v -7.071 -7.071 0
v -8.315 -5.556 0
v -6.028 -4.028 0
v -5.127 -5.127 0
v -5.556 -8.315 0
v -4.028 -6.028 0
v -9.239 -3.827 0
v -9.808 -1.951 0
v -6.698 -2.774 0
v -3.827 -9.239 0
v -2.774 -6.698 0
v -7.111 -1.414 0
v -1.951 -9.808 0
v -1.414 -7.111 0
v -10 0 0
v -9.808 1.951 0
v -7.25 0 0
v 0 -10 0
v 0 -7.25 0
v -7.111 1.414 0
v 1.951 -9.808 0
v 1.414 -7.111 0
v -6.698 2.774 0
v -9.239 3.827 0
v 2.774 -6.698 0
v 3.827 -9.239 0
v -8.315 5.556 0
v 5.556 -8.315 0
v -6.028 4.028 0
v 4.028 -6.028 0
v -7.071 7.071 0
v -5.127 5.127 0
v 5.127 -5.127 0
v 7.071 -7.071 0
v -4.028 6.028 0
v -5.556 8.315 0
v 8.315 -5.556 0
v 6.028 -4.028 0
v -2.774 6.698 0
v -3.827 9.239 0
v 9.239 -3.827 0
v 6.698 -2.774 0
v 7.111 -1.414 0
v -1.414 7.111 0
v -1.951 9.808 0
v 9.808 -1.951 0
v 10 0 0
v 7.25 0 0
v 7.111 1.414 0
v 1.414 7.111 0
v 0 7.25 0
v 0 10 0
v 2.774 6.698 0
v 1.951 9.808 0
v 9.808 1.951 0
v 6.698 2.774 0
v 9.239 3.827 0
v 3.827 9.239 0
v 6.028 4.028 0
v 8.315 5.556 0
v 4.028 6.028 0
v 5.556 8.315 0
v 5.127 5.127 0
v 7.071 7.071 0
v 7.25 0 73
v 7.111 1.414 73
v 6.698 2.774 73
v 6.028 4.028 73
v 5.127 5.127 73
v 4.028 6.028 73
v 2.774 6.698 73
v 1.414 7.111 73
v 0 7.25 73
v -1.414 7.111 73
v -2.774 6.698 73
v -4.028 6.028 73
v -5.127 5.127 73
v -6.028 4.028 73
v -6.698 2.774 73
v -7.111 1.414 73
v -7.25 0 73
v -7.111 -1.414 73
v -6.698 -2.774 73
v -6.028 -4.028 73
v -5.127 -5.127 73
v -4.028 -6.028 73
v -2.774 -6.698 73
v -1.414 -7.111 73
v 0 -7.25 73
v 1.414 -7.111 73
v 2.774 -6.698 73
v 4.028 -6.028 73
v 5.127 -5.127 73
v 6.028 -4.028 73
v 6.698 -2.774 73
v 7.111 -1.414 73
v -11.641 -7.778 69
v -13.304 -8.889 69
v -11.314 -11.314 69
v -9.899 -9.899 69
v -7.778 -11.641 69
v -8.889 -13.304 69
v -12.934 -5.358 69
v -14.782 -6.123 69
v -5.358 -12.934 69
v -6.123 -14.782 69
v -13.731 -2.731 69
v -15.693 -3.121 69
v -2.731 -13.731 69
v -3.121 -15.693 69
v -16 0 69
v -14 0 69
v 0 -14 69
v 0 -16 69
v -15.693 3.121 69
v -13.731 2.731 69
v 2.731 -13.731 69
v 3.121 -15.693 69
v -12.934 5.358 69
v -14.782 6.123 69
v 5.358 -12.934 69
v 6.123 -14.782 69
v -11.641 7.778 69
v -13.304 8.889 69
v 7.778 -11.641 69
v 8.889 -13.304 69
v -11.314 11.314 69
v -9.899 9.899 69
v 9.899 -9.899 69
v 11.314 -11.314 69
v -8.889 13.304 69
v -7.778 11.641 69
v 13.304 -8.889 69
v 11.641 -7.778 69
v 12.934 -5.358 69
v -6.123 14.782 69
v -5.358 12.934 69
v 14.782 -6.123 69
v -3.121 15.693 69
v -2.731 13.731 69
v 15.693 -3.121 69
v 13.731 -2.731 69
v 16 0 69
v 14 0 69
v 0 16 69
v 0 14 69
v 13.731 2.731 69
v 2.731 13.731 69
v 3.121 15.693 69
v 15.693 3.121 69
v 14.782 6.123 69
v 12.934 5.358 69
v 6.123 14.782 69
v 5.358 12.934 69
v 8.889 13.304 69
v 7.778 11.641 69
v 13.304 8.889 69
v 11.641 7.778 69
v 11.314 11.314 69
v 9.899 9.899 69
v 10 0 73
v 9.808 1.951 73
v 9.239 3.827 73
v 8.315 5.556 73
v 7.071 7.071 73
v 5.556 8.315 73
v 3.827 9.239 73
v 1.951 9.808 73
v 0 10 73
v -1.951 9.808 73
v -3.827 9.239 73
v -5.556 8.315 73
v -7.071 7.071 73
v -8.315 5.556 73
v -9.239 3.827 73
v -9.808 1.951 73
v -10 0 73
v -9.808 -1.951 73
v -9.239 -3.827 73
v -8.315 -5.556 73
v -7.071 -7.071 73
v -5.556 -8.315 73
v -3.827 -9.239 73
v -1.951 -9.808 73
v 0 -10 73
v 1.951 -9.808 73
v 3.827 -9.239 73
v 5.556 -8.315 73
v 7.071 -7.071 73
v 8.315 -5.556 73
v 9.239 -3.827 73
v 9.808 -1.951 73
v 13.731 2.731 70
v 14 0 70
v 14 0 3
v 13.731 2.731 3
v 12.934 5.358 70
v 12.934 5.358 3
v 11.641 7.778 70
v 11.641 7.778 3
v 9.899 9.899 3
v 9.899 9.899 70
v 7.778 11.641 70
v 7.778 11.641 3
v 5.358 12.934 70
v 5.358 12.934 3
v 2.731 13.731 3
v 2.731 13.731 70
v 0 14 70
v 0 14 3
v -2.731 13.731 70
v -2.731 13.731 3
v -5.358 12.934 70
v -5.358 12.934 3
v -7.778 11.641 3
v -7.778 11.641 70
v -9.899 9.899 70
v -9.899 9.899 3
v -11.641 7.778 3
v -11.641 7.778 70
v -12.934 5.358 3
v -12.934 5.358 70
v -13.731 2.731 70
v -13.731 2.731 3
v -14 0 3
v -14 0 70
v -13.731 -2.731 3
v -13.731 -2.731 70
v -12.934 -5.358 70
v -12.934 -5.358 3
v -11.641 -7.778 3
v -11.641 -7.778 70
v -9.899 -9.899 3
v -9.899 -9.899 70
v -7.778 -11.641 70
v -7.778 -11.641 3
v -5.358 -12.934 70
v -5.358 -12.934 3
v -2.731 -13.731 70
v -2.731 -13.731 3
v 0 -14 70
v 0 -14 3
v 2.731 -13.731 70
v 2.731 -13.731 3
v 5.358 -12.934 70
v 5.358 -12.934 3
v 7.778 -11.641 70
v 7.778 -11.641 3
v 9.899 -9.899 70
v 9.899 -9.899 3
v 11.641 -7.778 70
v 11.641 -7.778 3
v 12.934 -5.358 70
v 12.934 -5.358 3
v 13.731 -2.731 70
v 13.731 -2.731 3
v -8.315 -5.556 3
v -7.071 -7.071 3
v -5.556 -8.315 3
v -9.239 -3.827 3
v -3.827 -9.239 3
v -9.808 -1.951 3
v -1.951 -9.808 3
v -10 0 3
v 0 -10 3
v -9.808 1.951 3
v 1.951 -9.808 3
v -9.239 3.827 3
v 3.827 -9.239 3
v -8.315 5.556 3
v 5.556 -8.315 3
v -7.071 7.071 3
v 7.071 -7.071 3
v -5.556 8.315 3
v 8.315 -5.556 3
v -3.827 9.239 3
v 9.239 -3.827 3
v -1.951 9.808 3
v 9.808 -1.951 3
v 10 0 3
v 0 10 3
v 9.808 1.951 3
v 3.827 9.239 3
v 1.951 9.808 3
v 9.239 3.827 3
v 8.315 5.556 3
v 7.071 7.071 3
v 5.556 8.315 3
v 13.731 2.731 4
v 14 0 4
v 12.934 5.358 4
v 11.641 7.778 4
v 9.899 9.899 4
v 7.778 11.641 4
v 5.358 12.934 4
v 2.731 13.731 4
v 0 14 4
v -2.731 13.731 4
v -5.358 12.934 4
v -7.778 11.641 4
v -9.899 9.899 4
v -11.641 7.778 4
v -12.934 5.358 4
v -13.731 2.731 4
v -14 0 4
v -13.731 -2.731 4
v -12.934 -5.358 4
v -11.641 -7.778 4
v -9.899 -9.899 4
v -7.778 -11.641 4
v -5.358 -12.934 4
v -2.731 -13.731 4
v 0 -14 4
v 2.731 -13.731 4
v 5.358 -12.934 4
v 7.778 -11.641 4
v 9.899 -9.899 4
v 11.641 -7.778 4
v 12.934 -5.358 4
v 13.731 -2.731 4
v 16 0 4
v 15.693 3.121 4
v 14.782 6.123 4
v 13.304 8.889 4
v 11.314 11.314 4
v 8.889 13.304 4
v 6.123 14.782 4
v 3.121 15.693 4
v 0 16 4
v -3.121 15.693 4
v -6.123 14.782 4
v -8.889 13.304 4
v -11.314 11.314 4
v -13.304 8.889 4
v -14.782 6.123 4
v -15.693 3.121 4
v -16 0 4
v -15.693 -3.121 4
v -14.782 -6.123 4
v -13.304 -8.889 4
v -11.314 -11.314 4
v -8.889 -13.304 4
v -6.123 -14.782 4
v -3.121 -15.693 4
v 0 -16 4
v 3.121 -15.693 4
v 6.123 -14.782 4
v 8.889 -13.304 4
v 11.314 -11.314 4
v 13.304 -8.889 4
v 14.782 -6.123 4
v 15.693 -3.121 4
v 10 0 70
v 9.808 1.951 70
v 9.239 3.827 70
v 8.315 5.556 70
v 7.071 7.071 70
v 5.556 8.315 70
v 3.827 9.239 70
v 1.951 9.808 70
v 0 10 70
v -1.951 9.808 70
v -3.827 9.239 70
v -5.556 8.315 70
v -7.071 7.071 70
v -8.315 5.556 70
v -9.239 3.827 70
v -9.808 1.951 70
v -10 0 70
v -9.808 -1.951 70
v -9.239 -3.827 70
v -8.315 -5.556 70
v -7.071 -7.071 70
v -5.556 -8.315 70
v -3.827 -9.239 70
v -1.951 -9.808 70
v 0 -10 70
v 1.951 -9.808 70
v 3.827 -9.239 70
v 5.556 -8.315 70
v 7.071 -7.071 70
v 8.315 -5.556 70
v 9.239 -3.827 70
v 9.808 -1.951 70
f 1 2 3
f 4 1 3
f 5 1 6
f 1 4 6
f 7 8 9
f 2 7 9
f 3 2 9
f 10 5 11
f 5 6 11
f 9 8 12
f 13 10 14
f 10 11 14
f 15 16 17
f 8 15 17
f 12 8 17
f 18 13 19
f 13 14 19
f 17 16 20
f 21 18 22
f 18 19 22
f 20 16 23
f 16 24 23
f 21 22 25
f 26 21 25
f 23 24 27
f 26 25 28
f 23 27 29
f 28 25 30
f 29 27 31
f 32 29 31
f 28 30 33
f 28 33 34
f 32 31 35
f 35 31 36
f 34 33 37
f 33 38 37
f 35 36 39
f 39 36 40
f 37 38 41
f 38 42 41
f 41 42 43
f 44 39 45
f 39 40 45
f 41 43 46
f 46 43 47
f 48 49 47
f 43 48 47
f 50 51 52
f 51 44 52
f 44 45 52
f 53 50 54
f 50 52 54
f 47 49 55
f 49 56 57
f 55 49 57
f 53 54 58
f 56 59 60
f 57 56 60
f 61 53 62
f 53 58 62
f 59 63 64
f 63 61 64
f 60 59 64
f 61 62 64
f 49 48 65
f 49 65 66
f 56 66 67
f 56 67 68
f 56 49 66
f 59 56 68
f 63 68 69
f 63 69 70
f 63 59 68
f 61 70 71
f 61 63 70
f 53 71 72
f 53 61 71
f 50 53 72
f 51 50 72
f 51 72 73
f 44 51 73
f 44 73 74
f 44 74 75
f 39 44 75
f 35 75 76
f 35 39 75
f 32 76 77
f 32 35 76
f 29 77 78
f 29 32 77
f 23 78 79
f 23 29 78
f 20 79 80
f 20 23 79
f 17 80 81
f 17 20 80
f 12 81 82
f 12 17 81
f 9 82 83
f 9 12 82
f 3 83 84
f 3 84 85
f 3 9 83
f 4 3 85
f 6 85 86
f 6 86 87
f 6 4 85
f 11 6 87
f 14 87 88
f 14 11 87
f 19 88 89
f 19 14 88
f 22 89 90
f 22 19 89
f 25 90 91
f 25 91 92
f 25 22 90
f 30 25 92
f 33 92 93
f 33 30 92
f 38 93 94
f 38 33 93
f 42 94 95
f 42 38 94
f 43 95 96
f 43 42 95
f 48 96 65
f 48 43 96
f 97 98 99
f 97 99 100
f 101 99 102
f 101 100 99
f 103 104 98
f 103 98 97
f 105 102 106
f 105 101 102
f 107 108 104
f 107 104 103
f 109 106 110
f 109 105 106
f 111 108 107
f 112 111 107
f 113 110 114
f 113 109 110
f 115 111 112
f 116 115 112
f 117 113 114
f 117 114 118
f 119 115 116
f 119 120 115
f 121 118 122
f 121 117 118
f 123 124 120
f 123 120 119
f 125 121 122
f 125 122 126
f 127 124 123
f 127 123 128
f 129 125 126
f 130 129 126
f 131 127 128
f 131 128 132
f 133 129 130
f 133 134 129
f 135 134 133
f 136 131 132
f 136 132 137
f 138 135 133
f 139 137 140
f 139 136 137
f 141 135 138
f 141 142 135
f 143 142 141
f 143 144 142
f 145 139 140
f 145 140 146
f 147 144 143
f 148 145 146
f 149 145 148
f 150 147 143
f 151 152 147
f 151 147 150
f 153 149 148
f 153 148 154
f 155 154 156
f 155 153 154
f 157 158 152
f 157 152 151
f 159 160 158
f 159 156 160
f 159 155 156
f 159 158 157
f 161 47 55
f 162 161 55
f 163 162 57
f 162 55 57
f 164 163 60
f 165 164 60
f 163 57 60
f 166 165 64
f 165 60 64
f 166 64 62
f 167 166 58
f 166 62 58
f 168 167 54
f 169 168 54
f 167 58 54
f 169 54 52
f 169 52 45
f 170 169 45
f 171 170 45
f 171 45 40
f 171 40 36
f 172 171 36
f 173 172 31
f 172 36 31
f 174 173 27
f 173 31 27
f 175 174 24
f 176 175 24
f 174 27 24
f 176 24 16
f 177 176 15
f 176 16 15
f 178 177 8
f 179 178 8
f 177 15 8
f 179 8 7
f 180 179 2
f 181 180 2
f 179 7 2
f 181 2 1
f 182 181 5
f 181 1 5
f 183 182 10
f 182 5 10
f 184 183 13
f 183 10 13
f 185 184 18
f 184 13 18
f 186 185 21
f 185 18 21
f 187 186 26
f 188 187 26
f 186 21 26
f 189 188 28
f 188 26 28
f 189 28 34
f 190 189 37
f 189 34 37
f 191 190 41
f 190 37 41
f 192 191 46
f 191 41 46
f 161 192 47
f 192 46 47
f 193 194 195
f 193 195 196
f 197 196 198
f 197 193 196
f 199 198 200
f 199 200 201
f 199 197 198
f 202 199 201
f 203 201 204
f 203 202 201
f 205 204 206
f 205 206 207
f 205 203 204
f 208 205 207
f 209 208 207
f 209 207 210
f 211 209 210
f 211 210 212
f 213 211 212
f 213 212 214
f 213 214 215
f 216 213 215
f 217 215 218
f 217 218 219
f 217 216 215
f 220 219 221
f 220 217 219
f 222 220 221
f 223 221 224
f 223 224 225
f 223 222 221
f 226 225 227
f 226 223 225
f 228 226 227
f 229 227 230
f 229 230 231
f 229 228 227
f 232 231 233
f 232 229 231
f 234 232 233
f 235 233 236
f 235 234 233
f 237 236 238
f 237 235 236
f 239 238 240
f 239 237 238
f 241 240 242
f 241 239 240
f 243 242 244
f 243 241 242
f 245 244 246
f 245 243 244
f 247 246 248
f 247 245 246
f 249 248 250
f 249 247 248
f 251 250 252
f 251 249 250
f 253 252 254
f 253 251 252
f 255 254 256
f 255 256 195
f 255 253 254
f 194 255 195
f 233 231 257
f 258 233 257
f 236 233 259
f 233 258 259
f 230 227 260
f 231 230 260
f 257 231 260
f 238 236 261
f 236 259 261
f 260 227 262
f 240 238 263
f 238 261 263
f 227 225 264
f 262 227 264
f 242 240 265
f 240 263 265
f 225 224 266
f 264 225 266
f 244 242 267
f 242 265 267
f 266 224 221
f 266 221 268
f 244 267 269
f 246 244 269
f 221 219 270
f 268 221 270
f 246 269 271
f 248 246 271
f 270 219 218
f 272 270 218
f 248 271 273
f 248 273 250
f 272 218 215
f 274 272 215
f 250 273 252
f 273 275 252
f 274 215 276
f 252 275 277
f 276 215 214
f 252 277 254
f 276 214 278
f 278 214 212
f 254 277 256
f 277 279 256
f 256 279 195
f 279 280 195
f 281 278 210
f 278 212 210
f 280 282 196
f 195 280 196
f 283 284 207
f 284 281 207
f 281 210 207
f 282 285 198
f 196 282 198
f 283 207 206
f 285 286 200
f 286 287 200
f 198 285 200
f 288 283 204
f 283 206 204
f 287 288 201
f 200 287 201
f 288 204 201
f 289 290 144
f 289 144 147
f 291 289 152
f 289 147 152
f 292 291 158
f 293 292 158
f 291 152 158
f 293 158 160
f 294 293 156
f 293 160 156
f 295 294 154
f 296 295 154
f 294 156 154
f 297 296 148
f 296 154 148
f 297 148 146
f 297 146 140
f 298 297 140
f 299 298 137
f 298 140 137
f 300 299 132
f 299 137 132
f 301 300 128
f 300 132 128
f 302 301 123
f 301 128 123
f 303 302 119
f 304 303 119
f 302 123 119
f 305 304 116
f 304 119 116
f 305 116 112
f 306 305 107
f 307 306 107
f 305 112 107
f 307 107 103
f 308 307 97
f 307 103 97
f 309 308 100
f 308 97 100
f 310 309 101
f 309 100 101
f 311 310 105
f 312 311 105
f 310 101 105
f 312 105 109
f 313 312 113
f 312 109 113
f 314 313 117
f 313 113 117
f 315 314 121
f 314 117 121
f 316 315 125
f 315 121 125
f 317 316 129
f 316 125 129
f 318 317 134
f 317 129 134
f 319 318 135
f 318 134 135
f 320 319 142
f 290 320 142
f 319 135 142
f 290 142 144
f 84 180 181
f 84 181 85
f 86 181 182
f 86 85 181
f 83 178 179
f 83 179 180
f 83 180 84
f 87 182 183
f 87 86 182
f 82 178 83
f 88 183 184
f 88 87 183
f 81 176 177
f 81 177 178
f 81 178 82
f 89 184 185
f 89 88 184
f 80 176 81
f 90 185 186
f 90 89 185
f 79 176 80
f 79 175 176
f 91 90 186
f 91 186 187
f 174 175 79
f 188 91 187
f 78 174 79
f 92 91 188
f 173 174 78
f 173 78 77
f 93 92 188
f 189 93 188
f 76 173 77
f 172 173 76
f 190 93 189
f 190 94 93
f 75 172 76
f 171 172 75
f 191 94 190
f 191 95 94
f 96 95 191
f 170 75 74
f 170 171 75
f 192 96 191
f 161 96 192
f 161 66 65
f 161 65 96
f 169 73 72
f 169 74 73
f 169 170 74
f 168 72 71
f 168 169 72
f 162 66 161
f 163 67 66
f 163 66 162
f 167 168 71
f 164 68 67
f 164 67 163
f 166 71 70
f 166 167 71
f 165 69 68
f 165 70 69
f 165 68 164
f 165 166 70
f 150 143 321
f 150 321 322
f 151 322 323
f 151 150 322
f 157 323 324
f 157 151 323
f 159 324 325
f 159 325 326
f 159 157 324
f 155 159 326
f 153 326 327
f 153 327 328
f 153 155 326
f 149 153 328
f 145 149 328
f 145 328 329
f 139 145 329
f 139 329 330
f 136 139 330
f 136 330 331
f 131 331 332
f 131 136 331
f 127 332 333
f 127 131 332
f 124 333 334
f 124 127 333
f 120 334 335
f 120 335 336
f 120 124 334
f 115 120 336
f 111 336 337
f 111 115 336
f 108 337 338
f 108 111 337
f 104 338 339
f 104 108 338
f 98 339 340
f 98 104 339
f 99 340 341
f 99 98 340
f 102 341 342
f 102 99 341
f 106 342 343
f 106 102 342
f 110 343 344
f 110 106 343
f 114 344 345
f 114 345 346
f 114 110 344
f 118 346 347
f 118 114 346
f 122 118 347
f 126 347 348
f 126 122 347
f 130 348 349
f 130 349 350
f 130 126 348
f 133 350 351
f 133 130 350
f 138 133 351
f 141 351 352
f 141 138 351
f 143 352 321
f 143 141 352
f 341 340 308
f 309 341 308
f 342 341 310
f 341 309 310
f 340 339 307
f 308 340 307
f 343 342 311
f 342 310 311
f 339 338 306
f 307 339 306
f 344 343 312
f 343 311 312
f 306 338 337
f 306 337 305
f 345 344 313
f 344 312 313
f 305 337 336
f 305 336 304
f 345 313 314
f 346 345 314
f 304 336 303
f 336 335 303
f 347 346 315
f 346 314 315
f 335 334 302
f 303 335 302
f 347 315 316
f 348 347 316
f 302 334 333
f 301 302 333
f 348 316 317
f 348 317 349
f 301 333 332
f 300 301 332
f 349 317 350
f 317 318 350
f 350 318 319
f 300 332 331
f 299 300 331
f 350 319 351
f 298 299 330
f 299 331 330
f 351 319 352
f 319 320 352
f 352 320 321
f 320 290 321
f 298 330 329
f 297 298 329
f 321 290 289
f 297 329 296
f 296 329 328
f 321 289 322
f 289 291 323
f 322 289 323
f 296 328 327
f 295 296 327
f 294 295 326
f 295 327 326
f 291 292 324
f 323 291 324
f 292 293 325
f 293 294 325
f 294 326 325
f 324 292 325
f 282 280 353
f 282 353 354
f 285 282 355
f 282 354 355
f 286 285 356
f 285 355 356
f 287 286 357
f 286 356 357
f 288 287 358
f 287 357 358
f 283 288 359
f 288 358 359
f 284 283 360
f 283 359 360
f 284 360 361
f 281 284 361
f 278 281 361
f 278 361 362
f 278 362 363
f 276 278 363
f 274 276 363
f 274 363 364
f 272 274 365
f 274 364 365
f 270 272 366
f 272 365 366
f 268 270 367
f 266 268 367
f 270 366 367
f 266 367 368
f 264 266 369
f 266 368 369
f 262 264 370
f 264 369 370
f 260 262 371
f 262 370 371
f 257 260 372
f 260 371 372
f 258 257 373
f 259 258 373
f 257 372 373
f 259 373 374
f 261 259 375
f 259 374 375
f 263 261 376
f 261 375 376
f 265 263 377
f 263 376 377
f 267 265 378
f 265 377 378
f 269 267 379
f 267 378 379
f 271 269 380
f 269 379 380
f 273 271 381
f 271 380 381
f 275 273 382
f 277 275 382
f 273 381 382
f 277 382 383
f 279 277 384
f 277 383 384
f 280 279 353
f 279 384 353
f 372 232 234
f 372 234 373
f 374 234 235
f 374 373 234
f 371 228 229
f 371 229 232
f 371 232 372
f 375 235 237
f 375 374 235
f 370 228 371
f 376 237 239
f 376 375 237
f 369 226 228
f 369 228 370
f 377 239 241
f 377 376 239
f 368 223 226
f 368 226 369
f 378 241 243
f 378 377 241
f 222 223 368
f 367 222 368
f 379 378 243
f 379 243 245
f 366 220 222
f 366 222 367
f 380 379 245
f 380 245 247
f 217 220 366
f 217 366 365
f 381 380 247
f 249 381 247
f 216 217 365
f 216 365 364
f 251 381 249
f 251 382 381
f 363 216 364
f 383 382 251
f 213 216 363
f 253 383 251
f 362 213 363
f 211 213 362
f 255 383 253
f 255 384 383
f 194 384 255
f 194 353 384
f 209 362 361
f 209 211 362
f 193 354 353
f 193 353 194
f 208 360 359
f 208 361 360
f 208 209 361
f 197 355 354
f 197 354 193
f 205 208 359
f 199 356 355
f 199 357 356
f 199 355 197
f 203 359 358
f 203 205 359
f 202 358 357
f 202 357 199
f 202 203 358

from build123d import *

# Parameters (mm, degrees)
SKETCH_1_R         = 10
SKETCH_1_R_2       = 7.25
EXTRUDE_864_DEPTH  = 73
EXTRUDE_START      = -3
SKETCH_2_R         = 14
SKETCH_2_R_2       = 10
EXTRUDE_986_DEPTH  = 67
EXTRUDE_START_2    = -1
SKETCH_3_R         = 16
SKETCH_3_R_2       = 14
EXTRUDE_1108_DEPTH = 65


with BuildPart() as part:
    # 草图1 → Extrude 864 (new body)
    with BuildSketch(Plane.XY):
        Circle(SKETCH_1_R)
        Circle(SKETCH_1_R_2, mode=Mode.SUBTRACT)
    extrude(amount=EXTRUDE_864_DEPTH)


with BuildPart() as body_2:
    # 草图2 → Extrude 986 (new body)
    with BuildSketch(Plane.XY.offset(73).offset(EXTRUDE_START)):
        Circle(SKETCH_2_R)
        Circle(SKETCH_2_R_2, mode=Mode.SUBTRACT)
    extrude(amount=-EXTRUDE_986_DEPTH)


with BuildPart() as body_3:
    # 草图3 → Extrude 1108 (new body)
    with BuildSketch(Plane.XY.offset(70).offset(EXTRUDE_START_2)):
        Circle(SKETCH_3_R)
        Circle(SKETCH_3_R_2, mode=Mode.SUBTRACT)
    extrude(amount=-EXTRUDE_1108_DEPTH)


solid = Compound([part.part, body_2.part, body_3.part])
